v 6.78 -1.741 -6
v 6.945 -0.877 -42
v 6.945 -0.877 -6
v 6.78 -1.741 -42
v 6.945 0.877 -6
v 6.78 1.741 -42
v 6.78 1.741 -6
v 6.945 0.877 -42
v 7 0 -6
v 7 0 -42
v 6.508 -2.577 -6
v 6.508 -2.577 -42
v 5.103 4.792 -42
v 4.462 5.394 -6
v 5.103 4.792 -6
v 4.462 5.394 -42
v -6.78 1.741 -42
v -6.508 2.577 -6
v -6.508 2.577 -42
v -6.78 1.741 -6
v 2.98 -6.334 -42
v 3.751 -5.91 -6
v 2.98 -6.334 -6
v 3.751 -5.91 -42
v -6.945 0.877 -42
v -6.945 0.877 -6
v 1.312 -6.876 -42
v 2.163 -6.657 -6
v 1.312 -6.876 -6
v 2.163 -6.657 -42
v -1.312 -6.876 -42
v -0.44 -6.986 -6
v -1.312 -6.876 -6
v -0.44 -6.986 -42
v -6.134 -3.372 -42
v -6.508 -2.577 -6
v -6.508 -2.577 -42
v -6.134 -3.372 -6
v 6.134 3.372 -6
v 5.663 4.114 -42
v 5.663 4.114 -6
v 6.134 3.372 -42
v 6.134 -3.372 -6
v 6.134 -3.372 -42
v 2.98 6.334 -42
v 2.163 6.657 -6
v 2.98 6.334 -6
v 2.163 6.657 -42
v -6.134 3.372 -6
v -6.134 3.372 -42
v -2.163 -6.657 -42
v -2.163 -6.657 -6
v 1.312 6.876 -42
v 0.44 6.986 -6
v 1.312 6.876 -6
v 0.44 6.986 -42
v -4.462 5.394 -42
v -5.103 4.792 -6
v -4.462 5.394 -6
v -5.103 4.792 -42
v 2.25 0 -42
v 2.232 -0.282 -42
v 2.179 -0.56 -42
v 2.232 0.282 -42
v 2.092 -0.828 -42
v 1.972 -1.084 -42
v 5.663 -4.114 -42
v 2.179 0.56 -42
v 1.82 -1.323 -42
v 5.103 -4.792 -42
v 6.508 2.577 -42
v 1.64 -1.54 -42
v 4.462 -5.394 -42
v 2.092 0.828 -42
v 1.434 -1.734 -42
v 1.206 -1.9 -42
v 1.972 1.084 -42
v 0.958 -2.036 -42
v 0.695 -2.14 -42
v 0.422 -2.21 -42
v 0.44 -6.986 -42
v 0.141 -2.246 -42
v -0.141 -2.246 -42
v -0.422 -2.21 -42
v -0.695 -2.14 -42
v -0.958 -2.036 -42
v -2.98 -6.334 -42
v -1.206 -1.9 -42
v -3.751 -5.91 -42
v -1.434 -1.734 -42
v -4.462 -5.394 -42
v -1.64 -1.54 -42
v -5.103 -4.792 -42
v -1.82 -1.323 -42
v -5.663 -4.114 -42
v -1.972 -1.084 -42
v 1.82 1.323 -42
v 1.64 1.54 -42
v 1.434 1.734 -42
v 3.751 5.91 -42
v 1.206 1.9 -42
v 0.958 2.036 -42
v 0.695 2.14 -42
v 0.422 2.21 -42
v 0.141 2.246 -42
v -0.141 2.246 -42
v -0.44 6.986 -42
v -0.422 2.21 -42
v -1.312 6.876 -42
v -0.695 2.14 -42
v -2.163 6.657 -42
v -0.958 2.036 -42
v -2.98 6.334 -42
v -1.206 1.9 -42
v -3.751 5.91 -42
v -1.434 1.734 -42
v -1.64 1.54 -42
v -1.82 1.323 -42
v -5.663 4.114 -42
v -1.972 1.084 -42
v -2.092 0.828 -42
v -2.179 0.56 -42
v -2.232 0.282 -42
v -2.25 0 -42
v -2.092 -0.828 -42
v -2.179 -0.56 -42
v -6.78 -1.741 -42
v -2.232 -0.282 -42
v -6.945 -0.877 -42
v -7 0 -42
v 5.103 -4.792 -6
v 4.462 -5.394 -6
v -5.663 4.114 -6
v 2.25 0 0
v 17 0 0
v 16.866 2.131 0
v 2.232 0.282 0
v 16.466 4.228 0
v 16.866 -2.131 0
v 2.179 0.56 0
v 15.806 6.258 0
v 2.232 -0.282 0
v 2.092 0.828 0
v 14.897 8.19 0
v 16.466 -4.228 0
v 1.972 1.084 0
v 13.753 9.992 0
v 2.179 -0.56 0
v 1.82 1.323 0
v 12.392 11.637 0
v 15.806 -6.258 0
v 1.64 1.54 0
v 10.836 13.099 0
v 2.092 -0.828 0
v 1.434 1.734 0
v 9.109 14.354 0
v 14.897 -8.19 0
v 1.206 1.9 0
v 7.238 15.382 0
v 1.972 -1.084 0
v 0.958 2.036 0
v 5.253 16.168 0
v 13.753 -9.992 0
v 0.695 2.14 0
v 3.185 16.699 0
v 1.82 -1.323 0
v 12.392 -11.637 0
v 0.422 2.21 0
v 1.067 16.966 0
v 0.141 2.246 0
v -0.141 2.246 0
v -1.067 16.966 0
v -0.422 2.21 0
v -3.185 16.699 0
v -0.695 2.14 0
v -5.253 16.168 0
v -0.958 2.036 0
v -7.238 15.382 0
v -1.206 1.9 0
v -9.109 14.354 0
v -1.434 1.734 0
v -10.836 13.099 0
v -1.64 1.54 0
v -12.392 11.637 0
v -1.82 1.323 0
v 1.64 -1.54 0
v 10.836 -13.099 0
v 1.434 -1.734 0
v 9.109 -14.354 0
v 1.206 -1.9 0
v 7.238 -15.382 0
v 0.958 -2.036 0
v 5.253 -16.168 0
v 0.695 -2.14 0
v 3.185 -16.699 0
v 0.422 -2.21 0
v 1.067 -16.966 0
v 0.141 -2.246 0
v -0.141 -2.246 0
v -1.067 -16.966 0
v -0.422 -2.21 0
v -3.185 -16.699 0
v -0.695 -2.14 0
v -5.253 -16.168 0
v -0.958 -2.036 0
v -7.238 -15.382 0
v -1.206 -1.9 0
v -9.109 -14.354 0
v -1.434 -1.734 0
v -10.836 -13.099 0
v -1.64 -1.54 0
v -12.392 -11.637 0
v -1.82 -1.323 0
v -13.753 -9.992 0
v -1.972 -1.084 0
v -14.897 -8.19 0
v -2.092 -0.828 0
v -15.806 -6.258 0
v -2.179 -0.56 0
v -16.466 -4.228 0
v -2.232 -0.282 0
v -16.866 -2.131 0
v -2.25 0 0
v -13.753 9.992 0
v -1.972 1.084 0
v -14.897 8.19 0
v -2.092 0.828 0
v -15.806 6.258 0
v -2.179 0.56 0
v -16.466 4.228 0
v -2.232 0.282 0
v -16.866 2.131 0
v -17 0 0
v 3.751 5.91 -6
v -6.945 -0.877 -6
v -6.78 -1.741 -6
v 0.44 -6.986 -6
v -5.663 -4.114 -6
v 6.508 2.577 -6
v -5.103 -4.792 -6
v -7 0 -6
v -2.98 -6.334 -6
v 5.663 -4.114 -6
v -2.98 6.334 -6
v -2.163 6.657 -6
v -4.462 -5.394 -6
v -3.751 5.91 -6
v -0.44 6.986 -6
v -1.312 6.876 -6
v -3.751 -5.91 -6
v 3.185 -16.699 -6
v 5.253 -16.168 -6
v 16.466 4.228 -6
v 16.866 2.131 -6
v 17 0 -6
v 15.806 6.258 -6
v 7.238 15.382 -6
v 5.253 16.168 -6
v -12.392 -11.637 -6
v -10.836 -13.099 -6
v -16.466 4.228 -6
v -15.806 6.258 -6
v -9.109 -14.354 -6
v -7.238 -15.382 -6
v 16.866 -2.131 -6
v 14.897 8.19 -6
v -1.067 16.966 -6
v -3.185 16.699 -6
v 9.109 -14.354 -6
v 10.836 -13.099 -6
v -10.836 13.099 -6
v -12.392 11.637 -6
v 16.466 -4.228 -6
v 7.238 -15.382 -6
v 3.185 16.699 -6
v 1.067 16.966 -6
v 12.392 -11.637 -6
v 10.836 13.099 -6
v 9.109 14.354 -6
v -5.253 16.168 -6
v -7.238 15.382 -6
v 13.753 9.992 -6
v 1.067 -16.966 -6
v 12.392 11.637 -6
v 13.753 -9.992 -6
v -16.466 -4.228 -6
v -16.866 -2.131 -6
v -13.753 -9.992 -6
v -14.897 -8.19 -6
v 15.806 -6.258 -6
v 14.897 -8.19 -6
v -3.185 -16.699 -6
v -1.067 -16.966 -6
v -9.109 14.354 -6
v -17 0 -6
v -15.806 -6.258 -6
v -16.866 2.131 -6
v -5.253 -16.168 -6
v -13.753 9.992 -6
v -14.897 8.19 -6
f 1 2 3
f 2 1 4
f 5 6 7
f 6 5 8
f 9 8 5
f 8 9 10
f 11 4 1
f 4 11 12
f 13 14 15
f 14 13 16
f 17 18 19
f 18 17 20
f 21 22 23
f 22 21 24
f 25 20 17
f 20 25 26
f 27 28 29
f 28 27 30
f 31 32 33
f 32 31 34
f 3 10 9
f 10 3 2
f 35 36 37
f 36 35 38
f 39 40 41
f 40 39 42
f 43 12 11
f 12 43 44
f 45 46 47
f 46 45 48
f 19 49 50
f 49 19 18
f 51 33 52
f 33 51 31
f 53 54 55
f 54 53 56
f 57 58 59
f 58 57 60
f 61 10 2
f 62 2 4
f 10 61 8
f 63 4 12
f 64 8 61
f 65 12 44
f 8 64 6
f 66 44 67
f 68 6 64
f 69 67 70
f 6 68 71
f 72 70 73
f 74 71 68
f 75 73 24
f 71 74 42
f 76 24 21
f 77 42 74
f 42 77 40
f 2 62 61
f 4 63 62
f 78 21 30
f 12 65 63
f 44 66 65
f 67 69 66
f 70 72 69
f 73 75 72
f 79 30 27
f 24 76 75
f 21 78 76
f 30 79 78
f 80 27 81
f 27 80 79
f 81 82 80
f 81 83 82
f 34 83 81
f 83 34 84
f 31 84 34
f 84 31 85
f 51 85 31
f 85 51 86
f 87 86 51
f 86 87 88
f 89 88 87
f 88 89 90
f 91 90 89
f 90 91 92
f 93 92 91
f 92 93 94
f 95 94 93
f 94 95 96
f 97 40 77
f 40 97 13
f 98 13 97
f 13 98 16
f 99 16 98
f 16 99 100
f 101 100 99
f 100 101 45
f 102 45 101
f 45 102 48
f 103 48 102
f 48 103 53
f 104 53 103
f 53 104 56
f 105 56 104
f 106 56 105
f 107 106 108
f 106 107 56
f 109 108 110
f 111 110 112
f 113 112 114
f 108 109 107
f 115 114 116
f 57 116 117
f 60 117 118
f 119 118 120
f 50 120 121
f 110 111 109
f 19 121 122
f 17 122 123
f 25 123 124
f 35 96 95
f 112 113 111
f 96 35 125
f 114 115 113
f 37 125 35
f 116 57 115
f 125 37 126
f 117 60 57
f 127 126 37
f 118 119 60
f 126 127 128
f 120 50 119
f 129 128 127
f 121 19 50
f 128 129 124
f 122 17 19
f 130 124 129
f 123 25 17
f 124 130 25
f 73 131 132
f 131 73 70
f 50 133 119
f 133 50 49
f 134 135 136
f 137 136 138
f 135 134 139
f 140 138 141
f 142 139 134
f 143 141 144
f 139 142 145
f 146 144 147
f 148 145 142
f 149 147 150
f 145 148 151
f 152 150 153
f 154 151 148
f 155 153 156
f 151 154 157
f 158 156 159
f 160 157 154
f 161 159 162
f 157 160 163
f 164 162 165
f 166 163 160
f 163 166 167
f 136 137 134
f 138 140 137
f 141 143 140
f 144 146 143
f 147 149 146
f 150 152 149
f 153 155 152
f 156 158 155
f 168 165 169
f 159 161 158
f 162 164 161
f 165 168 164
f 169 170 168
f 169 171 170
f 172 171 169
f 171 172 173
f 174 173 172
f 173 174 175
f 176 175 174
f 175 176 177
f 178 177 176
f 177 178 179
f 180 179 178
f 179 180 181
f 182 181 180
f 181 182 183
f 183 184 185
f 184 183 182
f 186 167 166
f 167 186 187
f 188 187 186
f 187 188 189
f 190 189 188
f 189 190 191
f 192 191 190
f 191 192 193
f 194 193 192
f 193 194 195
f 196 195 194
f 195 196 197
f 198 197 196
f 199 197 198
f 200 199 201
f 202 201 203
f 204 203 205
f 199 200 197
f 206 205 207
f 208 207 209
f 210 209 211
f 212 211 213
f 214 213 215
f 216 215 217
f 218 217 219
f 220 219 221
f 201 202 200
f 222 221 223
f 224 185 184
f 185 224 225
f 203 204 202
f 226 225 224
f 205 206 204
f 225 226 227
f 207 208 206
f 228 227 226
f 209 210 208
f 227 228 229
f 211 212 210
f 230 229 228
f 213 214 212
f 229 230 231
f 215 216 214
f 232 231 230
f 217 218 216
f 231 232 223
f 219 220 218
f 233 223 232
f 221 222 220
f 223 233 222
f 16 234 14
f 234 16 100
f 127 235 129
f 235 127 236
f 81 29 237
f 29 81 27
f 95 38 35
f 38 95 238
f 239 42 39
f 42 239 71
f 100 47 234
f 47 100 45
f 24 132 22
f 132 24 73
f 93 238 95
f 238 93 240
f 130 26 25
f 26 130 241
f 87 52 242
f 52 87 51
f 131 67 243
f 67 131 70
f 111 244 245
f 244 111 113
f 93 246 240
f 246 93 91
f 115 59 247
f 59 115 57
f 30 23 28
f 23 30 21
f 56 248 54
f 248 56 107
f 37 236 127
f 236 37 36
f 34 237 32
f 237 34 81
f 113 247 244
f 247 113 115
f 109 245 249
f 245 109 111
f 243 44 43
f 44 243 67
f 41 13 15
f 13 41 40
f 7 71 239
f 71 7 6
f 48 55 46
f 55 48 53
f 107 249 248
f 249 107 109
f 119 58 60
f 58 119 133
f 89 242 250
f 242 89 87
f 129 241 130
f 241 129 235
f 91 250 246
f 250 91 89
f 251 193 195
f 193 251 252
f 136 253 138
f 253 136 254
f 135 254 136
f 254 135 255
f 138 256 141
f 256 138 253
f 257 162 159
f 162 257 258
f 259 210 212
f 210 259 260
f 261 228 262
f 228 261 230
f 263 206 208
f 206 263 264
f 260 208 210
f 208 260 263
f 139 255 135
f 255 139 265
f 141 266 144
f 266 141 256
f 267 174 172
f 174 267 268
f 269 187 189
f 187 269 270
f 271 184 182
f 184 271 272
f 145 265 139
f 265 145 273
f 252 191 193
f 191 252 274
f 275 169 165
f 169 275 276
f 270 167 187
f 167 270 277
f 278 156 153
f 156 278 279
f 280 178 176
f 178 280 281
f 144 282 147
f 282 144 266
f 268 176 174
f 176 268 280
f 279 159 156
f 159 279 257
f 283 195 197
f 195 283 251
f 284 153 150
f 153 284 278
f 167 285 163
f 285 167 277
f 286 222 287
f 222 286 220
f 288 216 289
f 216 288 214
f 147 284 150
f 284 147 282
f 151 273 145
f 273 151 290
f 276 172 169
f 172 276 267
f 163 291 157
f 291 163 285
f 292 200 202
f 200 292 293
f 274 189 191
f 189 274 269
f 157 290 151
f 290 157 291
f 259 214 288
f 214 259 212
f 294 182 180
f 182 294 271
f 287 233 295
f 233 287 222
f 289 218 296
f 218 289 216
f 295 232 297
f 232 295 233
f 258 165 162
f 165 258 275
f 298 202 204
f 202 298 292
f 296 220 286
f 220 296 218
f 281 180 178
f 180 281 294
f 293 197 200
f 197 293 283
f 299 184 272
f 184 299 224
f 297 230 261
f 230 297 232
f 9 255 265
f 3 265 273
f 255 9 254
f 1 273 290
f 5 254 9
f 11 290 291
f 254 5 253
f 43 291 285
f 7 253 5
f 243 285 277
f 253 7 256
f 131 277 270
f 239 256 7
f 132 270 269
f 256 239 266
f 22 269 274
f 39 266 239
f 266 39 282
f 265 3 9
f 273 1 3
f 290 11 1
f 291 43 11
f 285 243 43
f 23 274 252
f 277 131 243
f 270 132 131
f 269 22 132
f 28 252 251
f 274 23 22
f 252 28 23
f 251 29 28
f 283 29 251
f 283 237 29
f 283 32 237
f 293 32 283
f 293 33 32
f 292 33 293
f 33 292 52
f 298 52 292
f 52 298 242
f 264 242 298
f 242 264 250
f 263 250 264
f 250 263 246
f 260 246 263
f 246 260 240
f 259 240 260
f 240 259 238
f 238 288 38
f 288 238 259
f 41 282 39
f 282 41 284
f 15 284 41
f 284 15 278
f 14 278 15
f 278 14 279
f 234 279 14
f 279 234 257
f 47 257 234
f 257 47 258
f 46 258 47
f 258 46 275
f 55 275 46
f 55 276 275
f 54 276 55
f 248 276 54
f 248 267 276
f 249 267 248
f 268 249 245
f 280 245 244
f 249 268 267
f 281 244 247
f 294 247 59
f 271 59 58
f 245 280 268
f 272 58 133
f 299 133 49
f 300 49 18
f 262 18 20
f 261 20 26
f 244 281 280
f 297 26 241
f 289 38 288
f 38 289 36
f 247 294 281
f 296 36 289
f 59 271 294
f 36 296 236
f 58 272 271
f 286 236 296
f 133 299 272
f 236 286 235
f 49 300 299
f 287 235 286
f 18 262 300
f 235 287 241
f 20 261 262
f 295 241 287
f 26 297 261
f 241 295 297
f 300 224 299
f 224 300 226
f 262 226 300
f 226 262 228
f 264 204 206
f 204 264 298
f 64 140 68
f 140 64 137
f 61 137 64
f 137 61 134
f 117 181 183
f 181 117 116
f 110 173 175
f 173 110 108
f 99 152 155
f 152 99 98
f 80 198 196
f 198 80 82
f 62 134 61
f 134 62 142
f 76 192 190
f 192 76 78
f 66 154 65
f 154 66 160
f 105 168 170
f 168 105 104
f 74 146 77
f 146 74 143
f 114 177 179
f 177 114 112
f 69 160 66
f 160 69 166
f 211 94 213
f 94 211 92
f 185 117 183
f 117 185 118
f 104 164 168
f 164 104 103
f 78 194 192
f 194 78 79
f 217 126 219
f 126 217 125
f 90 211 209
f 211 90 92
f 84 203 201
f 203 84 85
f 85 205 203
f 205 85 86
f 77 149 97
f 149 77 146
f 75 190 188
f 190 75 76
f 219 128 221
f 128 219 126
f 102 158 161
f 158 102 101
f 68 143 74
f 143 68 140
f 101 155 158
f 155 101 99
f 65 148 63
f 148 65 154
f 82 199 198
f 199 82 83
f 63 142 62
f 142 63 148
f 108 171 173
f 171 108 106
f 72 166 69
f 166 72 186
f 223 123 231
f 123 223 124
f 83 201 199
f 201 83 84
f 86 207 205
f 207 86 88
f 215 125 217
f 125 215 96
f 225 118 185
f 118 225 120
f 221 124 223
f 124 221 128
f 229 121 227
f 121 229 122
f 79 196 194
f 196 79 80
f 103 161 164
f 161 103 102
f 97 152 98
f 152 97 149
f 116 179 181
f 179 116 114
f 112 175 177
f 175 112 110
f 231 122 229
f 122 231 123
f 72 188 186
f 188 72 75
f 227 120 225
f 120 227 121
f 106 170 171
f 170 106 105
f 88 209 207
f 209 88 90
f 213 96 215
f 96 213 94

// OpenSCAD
$fn = 50;


difference() {
	union() {
		translate(v = [0, 0, -42.0000000000]) {
			cylinder(h = 42, r = 7.0000000000);
		}
		translate(v = [0, 0, -6.0000000000]) {
			cylinder(h = 6, r = 17.0000000000);
		}
	}
	union() {
		#translate(v = [0, 0, -42]) {
			cylinder(h = 42, r = 2.2500000000);
		}
	}
}
